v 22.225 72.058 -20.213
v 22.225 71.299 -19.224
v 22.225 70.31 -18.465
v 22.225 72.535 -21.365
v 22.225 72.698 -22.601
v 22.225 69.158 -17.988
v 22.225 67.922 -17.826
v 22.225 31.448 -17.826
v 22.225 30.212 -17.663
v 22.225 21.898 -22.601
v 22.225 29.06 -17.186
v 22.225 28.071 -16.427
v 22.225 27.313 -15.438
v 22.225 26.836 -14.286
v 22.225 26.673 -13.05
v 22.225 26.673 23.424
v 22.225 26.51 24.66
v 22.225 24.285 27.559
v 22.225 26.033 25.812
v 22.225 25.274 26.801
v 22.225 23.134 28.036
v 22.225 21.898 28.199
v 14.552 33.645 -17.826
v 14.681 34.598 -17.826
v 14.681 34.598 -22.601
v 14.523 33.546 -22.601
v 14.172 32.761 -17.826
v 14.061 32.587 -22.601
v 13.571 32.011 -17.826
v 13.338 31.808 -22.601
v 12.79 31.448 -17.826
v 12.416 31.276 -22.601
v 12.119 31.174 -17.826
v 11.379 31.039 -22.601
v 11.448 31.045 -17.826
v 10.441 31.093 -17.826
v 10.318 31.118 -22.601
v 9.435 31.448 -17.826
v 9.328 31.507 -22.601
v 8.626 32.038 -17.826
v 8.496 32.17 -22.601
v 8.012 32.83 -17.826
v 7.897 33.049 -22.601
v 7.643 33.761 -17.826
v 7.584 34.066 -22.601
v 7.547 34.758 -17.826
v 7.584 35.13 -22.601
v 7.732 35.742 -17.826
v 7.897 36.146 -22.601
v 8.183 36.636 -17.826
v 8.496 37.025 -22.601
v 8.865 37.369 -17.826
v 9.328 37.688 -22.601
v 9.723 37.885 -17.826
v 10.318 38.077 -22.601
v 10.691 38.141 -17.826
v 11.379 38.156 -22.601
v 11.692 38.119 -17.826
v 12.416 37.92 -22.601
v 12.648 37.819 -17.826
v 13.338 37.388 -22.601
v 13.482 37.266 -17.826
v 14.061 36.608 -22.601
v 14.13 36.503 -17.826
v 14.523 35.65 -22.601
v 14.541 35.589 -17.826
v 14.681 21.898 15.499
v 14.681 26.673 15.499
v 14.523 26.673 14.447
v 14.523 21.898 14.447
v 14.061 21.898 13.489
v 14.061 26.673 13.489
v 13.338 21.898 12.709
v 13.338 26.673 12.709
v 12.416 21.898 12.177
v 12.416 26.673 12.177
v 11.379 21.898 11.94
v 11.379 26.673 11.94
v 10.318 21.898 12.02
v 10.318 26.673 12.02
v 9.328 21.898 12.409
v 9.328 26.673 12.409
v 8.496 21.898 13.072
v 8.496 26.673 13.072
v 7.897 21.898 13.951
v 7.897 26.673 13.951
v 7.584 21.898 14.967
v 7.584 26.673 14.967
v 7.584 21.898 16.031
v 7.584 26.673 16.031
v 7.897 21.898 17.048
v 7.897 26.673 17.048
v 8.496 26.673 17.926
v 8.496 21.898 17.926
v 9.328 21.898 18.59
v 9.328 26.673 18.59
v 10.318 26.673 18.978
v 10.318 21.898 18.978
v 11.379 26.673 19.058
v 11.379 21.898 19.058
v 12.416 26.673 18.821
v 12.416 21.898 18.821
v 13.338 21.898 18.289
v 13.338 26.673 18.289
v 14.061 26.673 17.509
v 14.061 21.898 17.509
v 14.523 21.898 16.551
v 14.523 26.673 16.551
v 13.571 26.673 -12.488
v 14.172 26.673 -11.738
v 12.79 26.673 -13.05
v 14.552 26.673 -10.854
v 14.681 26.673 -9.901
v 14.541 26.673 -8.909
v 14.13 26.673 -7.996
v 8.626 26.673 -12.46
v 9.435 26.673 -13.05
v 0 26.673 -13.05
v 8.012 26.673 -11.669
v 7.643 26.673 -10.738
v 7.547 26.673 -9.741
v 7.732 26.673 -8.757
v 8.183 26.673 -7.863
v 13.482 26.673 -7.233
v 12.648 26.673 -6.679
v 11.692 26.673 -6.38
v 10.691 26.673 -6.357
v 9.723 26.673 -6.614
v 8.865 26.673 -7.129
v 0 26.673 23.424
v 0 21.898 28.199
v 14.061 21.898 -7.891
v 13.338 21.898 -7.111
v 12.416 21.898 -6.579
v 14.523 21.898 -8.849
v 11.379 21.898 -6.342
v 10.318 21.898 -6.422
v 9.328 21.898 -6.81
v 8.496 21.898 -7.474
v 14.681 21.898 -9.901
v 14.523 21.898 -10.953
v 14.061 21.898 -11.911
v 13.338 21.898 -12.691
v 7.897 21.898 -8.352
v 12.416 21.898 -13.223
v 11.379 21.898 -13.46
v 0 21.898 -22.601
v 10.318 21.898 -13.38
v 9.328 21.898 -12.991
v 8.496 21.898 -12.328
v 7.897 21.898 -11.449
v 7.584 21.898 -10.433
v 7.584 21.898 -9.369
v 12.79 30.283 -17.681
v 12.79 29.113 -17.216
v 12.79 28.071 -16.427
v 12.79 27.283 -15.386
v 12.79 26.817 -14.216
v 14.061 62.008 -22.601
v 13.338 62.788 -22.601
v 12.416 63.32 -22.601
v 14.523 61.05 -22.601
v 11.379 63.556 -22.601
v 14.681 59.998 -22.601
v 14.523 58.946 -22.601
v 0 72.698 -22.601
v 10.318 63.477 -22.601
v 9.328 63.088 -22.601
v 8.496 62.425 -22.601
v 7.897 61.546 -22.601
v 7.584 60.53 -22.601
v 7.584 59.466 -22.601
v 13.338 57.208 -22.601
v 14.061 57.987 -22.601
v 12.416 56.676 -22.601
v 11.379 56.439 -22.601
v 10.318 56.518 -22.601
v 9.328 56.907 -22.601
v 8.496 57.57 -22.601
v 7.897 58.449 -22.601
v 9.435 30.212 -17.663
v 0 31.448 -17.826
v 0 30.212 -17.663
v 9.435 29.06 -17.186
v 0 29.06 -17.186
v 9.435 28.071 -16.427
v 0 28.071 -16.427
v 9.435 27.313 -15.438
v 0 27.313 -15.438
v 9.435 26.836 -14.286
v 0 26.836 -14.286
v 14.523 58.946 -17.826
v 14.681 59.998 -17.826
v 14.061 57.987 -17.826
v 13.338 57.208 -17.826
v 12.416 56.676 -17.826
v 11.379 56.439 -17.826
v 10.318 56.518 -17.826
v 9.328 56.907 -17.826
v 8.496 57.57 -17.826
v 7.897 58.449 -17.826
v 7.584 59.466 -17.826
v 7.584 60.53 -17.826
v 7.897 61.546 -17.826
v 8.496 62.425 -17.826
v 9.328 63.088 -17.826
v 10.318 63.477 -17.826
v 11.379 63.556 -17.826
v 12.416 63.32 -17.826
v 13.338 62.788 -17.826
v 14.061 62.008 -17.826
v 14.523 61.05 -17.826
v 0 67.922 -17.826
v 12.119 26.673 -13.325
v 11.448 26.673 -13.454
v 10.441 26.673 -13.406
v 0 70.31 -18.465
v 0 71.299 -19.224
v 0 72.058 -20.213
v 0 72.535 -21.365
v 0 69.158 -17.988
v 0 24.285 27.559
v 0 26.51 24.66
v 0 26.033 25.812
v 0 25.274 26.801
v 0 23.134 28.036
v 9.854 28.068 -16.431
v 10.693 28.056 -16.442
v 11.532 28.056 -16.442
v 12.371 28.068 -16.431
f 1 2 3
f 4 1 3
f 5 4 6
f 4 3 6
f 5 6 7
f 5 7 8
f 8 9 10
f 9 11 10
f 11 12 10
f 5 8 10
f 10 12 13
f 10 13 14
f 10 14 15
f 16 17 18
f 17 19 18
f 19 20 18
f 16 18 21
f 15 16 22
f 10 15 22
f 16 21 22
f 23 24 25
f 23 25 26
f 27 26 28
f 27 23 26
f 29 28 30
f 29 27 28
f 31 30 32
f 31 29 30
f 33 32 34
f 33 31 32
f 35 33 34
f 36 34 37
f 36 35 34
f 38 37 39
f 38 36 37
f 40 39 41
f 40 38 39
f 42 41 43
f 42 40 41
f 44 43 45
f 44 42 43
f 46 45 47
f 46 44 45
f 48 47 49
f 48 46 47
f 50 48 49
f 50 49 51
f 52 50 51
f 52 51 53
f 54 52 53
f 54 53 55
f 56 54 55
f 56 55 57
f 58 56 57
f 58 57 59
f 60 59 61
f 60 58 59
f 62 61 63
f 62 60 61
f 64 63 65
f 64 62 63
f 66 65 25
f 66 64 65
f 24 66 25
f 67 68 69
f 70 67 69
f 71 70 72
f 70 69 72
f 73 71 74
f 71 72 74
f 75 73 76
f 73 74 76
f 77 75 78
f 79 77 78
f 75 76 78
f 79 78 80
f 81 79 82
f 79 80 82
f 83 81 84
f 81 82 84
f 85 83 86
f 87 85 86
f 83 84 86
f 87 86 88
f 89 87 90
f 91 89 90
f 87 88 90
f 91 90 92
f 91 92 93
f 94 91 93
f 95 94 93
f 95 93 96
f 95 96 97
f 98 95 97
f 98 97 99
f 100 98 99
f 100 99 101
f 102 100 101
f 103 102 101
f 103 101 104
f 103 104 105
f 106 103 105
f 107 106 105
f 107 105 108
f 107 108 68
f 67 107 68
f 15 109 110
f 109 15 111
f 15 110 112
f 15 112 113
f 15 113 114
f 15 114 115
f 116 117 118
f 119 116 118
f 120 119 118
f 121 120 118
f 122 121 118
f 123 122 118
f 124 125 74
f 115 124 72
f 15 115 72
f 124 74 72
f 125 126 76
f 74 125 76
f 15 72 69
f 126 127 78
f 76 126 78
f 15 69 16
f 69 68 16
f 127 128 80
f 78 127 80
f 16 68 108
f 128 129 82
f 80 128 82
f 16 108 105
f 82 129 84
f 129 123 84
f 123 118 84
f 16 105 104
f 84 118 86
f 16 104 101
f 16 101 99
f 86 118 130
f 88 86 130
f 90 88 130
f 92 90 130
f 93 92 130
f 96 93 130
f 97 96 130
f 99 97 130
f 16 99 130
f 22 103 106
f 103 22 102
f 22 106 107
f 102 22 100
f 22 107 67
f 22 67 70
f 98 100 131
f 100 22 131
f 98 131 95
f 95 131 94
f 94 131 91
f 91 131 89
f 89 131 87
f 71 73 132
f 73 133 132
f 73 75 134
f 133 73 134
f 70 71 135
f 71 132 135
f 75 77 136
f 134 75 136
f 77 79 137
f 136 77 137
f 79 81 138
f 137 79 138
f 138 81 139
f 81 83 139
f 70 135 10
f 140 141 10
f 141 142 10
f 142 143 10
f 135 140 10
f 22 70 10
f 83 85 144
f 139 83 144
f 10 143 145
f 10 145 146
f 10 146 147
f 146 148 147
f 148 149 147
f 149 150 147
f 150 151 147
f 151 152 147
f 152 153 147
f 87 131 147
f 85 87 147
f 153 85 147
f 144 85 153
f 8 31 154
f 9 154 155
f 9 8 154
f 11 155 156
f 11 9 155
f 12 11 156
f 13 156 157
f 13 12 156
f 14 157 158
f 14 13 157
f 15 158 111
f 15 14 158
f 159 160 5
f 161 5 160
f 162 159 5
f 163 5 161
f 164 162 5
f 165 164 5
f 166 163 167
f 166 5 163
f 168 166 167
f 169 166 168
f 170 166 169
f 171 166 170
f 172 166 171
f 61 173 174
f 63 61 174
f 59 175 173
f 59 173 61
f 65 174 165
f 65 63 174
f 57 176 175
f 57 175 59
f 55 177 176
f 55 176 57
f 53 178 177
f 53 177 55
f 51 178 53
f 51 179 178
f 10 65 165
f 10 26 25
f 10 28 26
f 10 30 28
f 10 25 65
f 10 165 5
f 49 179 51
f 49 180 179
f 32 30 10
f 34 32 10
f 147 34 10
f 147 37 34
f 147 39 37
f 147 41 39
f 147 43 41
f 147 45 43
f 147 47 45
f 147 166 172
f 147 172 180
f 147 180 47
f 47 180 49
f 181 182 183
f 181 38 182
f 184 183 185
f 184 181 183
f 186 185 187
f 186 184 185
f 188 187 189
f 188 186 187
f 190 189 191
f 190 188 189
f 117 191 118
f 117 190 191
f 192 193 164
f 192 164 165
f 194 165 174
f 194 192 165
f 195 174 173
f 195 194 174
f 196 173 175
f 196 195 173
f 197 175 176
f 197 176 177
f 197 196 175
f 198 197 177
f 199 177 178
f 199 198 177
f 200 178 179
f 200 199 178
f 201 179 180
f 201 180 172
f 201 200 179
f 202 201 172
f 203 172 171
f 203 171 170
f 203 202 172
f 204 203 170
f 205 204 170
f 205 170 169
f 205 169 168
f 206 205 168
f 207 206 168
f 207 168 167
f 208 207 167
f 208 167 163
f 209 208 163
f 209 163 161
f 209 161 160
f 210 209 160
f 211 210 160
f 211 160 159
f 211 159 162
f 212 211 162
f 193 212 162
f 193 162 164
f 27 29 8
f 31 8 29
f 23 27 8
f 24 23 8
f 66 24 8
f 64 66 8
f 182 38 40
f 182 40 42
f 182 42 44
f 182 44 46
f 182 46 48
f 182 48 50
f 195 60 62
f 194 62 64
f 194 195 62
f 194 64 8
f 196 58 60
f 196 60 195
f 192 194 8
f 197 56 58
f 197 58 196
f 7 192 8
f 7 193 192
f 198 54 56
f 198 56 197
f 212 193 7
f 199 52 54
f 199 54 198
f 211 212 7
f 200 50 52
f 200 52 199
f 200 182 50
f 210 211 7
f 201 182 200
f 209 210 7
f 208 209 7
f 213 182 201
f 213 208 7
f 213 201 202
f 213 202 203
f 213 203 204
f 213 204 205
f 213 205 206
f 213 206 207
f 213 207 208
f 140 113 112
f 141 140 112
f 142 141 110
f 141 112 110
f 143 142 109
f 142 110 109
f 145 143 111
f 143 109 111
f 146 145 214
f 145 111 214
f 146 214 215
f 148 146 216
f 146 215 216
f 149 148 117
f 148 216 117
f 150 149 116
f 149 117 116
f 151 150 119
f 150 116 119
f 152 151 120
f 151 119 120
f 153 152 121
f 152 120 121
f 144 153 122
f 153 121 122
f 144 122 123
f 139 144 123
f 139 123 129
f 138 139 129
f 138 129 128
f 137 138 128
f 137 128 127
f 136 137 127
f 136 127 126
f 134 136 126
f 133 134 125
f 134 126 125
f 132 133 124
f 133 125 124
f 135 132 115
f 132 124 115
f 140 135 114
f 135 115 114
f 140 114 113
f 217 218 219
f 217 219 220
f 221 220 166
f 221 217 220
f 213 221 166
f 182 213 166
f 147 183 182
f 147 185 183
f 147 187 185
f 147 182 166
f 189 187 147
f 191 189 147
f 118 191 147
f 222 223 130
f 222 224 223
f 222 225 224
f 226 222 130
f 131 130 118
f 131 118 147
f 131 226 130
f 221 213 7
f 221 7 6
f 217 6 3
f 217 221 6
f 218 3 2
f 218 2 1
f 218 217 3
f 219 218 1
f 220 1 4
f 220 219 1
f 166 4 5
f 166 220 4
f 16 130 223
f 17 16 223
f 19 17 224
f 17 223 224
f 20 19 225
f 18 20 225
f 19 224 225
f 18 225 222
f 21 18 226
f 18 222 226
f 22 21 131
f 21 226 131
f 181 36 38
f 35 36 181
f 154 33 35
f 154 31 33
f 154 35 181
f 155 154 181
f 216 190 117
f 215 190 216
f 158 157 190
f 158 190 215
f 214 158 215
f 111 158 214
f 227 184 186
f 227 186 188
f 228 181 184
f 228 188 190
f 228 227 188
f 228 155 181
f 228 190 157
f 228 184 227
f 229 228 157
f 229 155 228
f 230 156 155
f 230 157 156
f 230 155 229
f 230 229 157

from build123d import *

# Parameters (mm, degrees)
EXTRUDE1_DEPTH     = 22.225
SKETCH2_R          = 3.5687
CUT_EXTRUDE1_DEPTH = 5.7752
FILLET1_R          = 4.7752


with BuildPart() as part:
    # Sketch1 → Extrude1 (new body)
    with BuildSketch(Plane(origin=(0, 0, 0), x_dir=(0, 0, -1), z_dir=(1, 0, 0))):
        with BuildLine():
            Line((-28.199163803, 21.897674685), (22.600836197, 21.897674685))
            Line((22.600836197, 21.897674685), (17.825636197, 26.672874685))
            Line((17.825636197, 26.672874685), (-23.423963803, 26.672874685))
            ThreePointArc((-23.423963803, 26.672874685), (-26.800540105, 25.274250987), (-28.199163803, 21.897674685))
        make_face()
    extrude(amount=EXTRUDE1_DEPTH)

    # Sketch2 → Cut-Extrude1 (cut, through all)
    with BuildSketch(Plane(origin=(0, 26.672874685, 0), x_dir=(1, 0, 0), z_dir=(0, 1, 0))):
        with Locations((11.1125, -15.499163803)):
            Circle(SKETCH2_R)
        with Locations((11.1125, 9.900836197)):
            Circle(SKETCH2_R)
    extrude(amount=-CUT_EXTRUDE1_DEPTH, mode=Mode.SUBTRACT)

    # Mirror1: part across plane


with BuildPart() as part_1:
    add(part.part)
    add(part.part.mirror(Plane(origin=(22.225, 21.897674685, -22.600836197), x_dir=(0, 0.707106781, 0.707106781), z_dir=(0, -0.707106781, 0.707106781))))

    # Fillet1
    fillet1_edges = [part_1.edges().sort_by_distance(p)[0] for p in [
        (11.1125, 26.672874685, -17.825636197),
    ]]
    fillet(fillet1_edges, radius=FILLET1_R)


solid = part_1.part
